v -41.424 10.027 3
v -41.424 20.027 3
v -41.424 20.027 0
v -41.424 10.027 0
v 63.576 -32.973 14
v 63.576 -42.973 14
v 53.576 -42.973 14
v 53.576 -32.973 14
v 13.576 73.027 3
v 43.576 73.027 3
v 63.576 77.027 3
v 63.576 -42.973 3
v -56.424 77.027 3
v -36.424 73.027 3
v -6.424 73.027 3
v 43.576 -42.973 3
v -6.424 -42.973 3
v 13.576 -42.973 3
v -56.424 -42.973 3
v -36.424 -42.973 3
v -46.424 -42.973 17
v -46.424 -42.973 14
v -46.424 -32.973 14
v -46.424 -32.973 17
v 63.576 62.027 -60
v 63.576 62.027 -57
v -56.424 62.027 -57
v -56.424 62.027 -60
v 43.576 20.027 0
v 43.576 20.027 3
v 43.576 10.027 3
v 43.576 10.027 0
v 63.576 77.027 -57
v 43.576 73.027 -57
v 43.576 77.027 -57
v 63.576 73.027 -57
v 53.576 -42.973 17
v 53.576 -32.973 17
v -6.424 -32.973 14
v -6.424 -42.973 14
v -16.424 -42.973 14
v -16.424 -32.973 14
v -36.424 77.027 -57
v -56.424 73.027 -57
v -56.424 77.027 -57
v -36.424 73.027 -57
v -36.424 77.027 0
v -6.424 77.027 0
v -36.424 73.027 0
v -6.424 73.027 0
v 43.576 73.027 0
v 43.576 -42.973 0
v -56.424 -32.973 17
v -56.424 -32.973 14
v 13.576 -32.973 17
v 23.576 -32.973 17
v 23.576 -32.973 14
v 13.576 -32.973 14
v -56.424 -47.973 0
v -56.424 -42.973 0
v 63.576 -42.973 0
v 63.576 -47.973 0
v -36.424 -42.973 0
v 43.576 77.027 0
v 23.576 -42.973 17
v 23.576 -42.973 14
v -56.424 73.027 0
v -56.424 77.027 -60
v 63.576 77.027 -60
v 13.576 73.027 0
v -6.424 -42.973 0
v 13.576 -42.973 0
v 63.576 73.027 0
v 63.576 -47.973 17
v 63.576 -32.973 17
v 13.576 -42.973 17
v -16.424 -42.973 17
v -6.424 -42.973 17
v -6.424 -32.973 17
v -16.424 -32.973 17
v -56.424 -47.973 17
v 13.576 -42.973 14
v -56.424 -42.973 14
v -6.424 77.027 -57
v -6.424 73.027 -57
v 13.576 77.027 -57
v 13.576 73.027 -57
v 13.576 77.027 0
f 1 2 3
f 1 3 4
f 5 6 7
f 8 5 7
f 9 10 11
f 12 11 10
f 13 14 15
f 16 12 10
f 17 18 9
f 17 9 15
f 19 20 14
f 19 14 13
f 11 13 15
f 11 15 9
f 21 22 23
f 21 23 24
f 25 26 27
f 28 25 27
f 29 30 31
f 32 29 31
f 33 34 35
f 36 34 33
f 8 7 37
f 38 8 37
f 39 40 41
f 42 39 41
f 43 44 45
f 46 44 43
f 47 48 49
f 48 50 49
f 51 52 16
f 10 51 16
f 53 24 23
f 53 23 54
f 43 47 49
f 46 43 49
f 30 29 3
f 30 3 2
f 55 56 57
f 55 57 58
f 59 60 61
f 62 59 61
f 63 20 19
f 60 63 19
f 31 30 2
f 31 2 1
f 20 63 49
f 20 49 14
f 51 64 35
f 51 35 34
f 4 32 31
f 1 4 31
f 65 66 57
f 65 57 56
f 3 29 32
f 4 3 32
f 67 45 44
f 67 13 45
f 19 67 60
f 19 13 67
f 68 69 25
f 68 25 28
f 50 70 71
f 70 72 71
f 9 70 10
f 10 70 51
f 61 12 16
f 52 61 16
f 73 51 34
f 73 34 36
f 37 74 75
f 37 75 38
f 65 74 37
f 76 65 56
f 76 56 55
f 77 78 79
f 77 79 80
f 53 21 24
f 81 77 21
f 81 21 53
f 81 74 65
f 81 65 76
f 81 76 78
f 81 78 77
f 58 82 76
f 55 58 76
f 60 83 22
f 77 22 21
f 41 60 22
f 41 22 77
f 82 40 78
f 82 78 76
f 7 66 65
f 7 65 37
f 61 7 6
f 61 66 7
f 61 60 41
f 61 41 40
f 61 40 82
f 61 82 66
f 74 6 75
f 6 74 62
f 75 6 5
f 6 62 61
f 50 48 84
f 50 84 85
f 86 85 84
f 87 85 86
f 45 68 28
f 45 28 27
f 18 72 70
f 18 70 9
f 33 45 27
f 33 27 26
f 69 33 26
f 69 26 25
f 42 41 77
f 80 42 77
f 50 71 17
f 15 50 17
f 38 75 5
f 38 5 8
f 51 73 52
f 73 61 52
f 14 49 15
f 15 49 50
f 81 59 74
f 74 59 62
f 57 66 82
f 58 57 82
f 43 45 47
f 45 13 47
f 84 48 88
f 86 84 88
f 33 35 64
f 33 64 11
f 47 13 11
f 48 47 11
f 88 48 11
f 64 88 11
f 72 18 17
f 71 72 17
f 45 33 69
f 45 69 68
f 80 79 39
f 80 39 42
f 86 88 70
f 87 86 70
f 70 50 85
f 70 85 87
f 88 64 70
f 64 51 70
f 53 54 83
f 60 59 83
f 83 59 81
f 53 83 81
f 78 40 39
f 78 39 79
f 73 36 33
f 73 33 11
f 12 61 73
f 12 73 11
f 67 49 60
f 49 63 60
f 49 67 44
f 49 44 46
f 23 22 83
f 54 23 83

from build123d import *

# Parameters (mm, degrees)
F0_W      = 120
F0_H      = 5
F1_DEPTH  = 17
F2_W      = 10
F2_H      = 3
F3_DEPTH  = 10
F4_W      = 20
F4_H      = 3
F5_DEPTH  = 120
F6_W      = 120
F6_H      = 4
F7_DEPTH  = 3
F8_W      = 20
F8_H      = 4
F9_DEPTH  = 57
F11_DEPTH = 15
F12_W     = 10
F12_H     = 3
F13_DEPTH = 85


with BuildPart() as f1:
    # F0 (on Top) → F1 (new body)
    with BuildSketch(Plane.XY):
        with Locations((3.5764351487, -45.4733344002)):
            Rectangle(F0_W, F0_H)
    extrude(amount=F1_DEPTH)

    # F2 (on face) → F3 (join)
    with BuildSketch(Plane(origin=(0, -42.9733344002, 0), x_dir=(-1, 0, 0), z_dir=(0, 1, 0))):
        with Locations((51.4235648513, 15.5)):
            Rectangle(F2_W, F2_H)
        with Locations((-58.5764351487, 15.5)):
            Rectangle(F2_W, F2_H)
        with Locations((11.4235648513, 15.5)):
            Rectangle(F2_W, F2_H)
        with Locations((-18.5764351487, 15.5)):
            Rectangle(F2_W, F2_H)
    extrude(amount=F3_DEPTH)


with BuildPart() as f5:
    # F4 (on face) → F5 (new body)
    with BuildSketch(Plane(origin=(0, -42.9733344002, 0), x_dir=(-1, 0, 0), z_dir=(0, 1, 0))):
        with Locations((46.4235648513, 1.5)):
            Rectangle(F4_W, F4_H)
    extrude(amount=F5_DEPTH)



with BuildPart() as f5b:
    # F4 (on face) → F5, piece 2 (new body)
    with BuildSketch(Plane(origin=(0, -42.9733344002, 0), x_dir=(-1, 0, 0), z_dir=(0, 1, 0))):
        with Locations((-3.5764351487, 1.5)):
            Rectangle(F4_W, F4_H)
    extrude(amount=F5_DEPTH)


with BuildPart() as f5c:
    # F4 (on face) → F5, piece 3 (new body)
    with BuildSketch(Plane(origin=(0, -42.9733344002, 0), x_dir=(-1, 0, 0), z_dir=(0, 1, 0))):
        with Locations((-53.5764351487, 1.5)):
            Rectangle(F4_W, F4_H)
    extrude(amount=F5_DEPTH)


with BuildPart() as f5_1:
    add(f5.part)

    add(f5b.part)  # F7 merges F5b

    add(f5c.part)  # F7 merges F5c
    # F6 (on face) → F7 (join)
    with BuildSketch(Plane(origin=(0, 0, 0), x_dir=(1, 0, 0), z_dir=(0, 0, -1))):
        with Locations((3.5764351487, -75.0266655998)):
            Rectangle(F6_W, F6_H)
    extrude(amount=-F7_DEPTH)

    # F8 (on face) → F9 (join)
    with BuildSketch(Plane(origin=(0, 0, 0), x_dir=(1, 0, 0), z_dir=(0, 0, -1))):
        with Locations((-46.4235648513, -75.0266655998)):
            Rectangle(F8_W, F8_H)
        with Locations((3.5764351487, -75.0266655998)):
            Rectangle(F8_W, F8_H)
        with Locations((53.5764351487, -75.0266655998)):
            Rectangle(F8_W, F8_H)
    extrude(amount=F9_DEPTH)


with BuildPart() as f11:
    # F10 (on face) → F11 (new body)
    with BuildSketch(Plane(origin=(0, 77.0266655998, 0), x_dir=(-1, 0, 0), z_dir=(0, 1, 0))):
        Polygon((56.4235648513, -60), (56.4235648513, -57), (36.4235648513, -57), (6.4235648513, -57), (-13.5764351487, -57), (-43.5764351487, -57), (-63.5764351487, -57), (-63.5764351487, -60), align=None)
    extrude(amount=-F11_DEPTH)


with BuildPart() as f13:
    # F12 (on face) → F13 (new body)
    with BuildSketch(Plane(origin=(43.5764351487, 0, 0), x_dir=(0, -1, 0), z_dir=(-1, 0, 0))):
        with Locations((-15.0266655998, 1.5)):
            Rectangle(F12_W, F12_H)
    extrude(amount=F13_DEPTH)


solid = Compound([f1.part, f5_1.part, f11.part, f13.part])
